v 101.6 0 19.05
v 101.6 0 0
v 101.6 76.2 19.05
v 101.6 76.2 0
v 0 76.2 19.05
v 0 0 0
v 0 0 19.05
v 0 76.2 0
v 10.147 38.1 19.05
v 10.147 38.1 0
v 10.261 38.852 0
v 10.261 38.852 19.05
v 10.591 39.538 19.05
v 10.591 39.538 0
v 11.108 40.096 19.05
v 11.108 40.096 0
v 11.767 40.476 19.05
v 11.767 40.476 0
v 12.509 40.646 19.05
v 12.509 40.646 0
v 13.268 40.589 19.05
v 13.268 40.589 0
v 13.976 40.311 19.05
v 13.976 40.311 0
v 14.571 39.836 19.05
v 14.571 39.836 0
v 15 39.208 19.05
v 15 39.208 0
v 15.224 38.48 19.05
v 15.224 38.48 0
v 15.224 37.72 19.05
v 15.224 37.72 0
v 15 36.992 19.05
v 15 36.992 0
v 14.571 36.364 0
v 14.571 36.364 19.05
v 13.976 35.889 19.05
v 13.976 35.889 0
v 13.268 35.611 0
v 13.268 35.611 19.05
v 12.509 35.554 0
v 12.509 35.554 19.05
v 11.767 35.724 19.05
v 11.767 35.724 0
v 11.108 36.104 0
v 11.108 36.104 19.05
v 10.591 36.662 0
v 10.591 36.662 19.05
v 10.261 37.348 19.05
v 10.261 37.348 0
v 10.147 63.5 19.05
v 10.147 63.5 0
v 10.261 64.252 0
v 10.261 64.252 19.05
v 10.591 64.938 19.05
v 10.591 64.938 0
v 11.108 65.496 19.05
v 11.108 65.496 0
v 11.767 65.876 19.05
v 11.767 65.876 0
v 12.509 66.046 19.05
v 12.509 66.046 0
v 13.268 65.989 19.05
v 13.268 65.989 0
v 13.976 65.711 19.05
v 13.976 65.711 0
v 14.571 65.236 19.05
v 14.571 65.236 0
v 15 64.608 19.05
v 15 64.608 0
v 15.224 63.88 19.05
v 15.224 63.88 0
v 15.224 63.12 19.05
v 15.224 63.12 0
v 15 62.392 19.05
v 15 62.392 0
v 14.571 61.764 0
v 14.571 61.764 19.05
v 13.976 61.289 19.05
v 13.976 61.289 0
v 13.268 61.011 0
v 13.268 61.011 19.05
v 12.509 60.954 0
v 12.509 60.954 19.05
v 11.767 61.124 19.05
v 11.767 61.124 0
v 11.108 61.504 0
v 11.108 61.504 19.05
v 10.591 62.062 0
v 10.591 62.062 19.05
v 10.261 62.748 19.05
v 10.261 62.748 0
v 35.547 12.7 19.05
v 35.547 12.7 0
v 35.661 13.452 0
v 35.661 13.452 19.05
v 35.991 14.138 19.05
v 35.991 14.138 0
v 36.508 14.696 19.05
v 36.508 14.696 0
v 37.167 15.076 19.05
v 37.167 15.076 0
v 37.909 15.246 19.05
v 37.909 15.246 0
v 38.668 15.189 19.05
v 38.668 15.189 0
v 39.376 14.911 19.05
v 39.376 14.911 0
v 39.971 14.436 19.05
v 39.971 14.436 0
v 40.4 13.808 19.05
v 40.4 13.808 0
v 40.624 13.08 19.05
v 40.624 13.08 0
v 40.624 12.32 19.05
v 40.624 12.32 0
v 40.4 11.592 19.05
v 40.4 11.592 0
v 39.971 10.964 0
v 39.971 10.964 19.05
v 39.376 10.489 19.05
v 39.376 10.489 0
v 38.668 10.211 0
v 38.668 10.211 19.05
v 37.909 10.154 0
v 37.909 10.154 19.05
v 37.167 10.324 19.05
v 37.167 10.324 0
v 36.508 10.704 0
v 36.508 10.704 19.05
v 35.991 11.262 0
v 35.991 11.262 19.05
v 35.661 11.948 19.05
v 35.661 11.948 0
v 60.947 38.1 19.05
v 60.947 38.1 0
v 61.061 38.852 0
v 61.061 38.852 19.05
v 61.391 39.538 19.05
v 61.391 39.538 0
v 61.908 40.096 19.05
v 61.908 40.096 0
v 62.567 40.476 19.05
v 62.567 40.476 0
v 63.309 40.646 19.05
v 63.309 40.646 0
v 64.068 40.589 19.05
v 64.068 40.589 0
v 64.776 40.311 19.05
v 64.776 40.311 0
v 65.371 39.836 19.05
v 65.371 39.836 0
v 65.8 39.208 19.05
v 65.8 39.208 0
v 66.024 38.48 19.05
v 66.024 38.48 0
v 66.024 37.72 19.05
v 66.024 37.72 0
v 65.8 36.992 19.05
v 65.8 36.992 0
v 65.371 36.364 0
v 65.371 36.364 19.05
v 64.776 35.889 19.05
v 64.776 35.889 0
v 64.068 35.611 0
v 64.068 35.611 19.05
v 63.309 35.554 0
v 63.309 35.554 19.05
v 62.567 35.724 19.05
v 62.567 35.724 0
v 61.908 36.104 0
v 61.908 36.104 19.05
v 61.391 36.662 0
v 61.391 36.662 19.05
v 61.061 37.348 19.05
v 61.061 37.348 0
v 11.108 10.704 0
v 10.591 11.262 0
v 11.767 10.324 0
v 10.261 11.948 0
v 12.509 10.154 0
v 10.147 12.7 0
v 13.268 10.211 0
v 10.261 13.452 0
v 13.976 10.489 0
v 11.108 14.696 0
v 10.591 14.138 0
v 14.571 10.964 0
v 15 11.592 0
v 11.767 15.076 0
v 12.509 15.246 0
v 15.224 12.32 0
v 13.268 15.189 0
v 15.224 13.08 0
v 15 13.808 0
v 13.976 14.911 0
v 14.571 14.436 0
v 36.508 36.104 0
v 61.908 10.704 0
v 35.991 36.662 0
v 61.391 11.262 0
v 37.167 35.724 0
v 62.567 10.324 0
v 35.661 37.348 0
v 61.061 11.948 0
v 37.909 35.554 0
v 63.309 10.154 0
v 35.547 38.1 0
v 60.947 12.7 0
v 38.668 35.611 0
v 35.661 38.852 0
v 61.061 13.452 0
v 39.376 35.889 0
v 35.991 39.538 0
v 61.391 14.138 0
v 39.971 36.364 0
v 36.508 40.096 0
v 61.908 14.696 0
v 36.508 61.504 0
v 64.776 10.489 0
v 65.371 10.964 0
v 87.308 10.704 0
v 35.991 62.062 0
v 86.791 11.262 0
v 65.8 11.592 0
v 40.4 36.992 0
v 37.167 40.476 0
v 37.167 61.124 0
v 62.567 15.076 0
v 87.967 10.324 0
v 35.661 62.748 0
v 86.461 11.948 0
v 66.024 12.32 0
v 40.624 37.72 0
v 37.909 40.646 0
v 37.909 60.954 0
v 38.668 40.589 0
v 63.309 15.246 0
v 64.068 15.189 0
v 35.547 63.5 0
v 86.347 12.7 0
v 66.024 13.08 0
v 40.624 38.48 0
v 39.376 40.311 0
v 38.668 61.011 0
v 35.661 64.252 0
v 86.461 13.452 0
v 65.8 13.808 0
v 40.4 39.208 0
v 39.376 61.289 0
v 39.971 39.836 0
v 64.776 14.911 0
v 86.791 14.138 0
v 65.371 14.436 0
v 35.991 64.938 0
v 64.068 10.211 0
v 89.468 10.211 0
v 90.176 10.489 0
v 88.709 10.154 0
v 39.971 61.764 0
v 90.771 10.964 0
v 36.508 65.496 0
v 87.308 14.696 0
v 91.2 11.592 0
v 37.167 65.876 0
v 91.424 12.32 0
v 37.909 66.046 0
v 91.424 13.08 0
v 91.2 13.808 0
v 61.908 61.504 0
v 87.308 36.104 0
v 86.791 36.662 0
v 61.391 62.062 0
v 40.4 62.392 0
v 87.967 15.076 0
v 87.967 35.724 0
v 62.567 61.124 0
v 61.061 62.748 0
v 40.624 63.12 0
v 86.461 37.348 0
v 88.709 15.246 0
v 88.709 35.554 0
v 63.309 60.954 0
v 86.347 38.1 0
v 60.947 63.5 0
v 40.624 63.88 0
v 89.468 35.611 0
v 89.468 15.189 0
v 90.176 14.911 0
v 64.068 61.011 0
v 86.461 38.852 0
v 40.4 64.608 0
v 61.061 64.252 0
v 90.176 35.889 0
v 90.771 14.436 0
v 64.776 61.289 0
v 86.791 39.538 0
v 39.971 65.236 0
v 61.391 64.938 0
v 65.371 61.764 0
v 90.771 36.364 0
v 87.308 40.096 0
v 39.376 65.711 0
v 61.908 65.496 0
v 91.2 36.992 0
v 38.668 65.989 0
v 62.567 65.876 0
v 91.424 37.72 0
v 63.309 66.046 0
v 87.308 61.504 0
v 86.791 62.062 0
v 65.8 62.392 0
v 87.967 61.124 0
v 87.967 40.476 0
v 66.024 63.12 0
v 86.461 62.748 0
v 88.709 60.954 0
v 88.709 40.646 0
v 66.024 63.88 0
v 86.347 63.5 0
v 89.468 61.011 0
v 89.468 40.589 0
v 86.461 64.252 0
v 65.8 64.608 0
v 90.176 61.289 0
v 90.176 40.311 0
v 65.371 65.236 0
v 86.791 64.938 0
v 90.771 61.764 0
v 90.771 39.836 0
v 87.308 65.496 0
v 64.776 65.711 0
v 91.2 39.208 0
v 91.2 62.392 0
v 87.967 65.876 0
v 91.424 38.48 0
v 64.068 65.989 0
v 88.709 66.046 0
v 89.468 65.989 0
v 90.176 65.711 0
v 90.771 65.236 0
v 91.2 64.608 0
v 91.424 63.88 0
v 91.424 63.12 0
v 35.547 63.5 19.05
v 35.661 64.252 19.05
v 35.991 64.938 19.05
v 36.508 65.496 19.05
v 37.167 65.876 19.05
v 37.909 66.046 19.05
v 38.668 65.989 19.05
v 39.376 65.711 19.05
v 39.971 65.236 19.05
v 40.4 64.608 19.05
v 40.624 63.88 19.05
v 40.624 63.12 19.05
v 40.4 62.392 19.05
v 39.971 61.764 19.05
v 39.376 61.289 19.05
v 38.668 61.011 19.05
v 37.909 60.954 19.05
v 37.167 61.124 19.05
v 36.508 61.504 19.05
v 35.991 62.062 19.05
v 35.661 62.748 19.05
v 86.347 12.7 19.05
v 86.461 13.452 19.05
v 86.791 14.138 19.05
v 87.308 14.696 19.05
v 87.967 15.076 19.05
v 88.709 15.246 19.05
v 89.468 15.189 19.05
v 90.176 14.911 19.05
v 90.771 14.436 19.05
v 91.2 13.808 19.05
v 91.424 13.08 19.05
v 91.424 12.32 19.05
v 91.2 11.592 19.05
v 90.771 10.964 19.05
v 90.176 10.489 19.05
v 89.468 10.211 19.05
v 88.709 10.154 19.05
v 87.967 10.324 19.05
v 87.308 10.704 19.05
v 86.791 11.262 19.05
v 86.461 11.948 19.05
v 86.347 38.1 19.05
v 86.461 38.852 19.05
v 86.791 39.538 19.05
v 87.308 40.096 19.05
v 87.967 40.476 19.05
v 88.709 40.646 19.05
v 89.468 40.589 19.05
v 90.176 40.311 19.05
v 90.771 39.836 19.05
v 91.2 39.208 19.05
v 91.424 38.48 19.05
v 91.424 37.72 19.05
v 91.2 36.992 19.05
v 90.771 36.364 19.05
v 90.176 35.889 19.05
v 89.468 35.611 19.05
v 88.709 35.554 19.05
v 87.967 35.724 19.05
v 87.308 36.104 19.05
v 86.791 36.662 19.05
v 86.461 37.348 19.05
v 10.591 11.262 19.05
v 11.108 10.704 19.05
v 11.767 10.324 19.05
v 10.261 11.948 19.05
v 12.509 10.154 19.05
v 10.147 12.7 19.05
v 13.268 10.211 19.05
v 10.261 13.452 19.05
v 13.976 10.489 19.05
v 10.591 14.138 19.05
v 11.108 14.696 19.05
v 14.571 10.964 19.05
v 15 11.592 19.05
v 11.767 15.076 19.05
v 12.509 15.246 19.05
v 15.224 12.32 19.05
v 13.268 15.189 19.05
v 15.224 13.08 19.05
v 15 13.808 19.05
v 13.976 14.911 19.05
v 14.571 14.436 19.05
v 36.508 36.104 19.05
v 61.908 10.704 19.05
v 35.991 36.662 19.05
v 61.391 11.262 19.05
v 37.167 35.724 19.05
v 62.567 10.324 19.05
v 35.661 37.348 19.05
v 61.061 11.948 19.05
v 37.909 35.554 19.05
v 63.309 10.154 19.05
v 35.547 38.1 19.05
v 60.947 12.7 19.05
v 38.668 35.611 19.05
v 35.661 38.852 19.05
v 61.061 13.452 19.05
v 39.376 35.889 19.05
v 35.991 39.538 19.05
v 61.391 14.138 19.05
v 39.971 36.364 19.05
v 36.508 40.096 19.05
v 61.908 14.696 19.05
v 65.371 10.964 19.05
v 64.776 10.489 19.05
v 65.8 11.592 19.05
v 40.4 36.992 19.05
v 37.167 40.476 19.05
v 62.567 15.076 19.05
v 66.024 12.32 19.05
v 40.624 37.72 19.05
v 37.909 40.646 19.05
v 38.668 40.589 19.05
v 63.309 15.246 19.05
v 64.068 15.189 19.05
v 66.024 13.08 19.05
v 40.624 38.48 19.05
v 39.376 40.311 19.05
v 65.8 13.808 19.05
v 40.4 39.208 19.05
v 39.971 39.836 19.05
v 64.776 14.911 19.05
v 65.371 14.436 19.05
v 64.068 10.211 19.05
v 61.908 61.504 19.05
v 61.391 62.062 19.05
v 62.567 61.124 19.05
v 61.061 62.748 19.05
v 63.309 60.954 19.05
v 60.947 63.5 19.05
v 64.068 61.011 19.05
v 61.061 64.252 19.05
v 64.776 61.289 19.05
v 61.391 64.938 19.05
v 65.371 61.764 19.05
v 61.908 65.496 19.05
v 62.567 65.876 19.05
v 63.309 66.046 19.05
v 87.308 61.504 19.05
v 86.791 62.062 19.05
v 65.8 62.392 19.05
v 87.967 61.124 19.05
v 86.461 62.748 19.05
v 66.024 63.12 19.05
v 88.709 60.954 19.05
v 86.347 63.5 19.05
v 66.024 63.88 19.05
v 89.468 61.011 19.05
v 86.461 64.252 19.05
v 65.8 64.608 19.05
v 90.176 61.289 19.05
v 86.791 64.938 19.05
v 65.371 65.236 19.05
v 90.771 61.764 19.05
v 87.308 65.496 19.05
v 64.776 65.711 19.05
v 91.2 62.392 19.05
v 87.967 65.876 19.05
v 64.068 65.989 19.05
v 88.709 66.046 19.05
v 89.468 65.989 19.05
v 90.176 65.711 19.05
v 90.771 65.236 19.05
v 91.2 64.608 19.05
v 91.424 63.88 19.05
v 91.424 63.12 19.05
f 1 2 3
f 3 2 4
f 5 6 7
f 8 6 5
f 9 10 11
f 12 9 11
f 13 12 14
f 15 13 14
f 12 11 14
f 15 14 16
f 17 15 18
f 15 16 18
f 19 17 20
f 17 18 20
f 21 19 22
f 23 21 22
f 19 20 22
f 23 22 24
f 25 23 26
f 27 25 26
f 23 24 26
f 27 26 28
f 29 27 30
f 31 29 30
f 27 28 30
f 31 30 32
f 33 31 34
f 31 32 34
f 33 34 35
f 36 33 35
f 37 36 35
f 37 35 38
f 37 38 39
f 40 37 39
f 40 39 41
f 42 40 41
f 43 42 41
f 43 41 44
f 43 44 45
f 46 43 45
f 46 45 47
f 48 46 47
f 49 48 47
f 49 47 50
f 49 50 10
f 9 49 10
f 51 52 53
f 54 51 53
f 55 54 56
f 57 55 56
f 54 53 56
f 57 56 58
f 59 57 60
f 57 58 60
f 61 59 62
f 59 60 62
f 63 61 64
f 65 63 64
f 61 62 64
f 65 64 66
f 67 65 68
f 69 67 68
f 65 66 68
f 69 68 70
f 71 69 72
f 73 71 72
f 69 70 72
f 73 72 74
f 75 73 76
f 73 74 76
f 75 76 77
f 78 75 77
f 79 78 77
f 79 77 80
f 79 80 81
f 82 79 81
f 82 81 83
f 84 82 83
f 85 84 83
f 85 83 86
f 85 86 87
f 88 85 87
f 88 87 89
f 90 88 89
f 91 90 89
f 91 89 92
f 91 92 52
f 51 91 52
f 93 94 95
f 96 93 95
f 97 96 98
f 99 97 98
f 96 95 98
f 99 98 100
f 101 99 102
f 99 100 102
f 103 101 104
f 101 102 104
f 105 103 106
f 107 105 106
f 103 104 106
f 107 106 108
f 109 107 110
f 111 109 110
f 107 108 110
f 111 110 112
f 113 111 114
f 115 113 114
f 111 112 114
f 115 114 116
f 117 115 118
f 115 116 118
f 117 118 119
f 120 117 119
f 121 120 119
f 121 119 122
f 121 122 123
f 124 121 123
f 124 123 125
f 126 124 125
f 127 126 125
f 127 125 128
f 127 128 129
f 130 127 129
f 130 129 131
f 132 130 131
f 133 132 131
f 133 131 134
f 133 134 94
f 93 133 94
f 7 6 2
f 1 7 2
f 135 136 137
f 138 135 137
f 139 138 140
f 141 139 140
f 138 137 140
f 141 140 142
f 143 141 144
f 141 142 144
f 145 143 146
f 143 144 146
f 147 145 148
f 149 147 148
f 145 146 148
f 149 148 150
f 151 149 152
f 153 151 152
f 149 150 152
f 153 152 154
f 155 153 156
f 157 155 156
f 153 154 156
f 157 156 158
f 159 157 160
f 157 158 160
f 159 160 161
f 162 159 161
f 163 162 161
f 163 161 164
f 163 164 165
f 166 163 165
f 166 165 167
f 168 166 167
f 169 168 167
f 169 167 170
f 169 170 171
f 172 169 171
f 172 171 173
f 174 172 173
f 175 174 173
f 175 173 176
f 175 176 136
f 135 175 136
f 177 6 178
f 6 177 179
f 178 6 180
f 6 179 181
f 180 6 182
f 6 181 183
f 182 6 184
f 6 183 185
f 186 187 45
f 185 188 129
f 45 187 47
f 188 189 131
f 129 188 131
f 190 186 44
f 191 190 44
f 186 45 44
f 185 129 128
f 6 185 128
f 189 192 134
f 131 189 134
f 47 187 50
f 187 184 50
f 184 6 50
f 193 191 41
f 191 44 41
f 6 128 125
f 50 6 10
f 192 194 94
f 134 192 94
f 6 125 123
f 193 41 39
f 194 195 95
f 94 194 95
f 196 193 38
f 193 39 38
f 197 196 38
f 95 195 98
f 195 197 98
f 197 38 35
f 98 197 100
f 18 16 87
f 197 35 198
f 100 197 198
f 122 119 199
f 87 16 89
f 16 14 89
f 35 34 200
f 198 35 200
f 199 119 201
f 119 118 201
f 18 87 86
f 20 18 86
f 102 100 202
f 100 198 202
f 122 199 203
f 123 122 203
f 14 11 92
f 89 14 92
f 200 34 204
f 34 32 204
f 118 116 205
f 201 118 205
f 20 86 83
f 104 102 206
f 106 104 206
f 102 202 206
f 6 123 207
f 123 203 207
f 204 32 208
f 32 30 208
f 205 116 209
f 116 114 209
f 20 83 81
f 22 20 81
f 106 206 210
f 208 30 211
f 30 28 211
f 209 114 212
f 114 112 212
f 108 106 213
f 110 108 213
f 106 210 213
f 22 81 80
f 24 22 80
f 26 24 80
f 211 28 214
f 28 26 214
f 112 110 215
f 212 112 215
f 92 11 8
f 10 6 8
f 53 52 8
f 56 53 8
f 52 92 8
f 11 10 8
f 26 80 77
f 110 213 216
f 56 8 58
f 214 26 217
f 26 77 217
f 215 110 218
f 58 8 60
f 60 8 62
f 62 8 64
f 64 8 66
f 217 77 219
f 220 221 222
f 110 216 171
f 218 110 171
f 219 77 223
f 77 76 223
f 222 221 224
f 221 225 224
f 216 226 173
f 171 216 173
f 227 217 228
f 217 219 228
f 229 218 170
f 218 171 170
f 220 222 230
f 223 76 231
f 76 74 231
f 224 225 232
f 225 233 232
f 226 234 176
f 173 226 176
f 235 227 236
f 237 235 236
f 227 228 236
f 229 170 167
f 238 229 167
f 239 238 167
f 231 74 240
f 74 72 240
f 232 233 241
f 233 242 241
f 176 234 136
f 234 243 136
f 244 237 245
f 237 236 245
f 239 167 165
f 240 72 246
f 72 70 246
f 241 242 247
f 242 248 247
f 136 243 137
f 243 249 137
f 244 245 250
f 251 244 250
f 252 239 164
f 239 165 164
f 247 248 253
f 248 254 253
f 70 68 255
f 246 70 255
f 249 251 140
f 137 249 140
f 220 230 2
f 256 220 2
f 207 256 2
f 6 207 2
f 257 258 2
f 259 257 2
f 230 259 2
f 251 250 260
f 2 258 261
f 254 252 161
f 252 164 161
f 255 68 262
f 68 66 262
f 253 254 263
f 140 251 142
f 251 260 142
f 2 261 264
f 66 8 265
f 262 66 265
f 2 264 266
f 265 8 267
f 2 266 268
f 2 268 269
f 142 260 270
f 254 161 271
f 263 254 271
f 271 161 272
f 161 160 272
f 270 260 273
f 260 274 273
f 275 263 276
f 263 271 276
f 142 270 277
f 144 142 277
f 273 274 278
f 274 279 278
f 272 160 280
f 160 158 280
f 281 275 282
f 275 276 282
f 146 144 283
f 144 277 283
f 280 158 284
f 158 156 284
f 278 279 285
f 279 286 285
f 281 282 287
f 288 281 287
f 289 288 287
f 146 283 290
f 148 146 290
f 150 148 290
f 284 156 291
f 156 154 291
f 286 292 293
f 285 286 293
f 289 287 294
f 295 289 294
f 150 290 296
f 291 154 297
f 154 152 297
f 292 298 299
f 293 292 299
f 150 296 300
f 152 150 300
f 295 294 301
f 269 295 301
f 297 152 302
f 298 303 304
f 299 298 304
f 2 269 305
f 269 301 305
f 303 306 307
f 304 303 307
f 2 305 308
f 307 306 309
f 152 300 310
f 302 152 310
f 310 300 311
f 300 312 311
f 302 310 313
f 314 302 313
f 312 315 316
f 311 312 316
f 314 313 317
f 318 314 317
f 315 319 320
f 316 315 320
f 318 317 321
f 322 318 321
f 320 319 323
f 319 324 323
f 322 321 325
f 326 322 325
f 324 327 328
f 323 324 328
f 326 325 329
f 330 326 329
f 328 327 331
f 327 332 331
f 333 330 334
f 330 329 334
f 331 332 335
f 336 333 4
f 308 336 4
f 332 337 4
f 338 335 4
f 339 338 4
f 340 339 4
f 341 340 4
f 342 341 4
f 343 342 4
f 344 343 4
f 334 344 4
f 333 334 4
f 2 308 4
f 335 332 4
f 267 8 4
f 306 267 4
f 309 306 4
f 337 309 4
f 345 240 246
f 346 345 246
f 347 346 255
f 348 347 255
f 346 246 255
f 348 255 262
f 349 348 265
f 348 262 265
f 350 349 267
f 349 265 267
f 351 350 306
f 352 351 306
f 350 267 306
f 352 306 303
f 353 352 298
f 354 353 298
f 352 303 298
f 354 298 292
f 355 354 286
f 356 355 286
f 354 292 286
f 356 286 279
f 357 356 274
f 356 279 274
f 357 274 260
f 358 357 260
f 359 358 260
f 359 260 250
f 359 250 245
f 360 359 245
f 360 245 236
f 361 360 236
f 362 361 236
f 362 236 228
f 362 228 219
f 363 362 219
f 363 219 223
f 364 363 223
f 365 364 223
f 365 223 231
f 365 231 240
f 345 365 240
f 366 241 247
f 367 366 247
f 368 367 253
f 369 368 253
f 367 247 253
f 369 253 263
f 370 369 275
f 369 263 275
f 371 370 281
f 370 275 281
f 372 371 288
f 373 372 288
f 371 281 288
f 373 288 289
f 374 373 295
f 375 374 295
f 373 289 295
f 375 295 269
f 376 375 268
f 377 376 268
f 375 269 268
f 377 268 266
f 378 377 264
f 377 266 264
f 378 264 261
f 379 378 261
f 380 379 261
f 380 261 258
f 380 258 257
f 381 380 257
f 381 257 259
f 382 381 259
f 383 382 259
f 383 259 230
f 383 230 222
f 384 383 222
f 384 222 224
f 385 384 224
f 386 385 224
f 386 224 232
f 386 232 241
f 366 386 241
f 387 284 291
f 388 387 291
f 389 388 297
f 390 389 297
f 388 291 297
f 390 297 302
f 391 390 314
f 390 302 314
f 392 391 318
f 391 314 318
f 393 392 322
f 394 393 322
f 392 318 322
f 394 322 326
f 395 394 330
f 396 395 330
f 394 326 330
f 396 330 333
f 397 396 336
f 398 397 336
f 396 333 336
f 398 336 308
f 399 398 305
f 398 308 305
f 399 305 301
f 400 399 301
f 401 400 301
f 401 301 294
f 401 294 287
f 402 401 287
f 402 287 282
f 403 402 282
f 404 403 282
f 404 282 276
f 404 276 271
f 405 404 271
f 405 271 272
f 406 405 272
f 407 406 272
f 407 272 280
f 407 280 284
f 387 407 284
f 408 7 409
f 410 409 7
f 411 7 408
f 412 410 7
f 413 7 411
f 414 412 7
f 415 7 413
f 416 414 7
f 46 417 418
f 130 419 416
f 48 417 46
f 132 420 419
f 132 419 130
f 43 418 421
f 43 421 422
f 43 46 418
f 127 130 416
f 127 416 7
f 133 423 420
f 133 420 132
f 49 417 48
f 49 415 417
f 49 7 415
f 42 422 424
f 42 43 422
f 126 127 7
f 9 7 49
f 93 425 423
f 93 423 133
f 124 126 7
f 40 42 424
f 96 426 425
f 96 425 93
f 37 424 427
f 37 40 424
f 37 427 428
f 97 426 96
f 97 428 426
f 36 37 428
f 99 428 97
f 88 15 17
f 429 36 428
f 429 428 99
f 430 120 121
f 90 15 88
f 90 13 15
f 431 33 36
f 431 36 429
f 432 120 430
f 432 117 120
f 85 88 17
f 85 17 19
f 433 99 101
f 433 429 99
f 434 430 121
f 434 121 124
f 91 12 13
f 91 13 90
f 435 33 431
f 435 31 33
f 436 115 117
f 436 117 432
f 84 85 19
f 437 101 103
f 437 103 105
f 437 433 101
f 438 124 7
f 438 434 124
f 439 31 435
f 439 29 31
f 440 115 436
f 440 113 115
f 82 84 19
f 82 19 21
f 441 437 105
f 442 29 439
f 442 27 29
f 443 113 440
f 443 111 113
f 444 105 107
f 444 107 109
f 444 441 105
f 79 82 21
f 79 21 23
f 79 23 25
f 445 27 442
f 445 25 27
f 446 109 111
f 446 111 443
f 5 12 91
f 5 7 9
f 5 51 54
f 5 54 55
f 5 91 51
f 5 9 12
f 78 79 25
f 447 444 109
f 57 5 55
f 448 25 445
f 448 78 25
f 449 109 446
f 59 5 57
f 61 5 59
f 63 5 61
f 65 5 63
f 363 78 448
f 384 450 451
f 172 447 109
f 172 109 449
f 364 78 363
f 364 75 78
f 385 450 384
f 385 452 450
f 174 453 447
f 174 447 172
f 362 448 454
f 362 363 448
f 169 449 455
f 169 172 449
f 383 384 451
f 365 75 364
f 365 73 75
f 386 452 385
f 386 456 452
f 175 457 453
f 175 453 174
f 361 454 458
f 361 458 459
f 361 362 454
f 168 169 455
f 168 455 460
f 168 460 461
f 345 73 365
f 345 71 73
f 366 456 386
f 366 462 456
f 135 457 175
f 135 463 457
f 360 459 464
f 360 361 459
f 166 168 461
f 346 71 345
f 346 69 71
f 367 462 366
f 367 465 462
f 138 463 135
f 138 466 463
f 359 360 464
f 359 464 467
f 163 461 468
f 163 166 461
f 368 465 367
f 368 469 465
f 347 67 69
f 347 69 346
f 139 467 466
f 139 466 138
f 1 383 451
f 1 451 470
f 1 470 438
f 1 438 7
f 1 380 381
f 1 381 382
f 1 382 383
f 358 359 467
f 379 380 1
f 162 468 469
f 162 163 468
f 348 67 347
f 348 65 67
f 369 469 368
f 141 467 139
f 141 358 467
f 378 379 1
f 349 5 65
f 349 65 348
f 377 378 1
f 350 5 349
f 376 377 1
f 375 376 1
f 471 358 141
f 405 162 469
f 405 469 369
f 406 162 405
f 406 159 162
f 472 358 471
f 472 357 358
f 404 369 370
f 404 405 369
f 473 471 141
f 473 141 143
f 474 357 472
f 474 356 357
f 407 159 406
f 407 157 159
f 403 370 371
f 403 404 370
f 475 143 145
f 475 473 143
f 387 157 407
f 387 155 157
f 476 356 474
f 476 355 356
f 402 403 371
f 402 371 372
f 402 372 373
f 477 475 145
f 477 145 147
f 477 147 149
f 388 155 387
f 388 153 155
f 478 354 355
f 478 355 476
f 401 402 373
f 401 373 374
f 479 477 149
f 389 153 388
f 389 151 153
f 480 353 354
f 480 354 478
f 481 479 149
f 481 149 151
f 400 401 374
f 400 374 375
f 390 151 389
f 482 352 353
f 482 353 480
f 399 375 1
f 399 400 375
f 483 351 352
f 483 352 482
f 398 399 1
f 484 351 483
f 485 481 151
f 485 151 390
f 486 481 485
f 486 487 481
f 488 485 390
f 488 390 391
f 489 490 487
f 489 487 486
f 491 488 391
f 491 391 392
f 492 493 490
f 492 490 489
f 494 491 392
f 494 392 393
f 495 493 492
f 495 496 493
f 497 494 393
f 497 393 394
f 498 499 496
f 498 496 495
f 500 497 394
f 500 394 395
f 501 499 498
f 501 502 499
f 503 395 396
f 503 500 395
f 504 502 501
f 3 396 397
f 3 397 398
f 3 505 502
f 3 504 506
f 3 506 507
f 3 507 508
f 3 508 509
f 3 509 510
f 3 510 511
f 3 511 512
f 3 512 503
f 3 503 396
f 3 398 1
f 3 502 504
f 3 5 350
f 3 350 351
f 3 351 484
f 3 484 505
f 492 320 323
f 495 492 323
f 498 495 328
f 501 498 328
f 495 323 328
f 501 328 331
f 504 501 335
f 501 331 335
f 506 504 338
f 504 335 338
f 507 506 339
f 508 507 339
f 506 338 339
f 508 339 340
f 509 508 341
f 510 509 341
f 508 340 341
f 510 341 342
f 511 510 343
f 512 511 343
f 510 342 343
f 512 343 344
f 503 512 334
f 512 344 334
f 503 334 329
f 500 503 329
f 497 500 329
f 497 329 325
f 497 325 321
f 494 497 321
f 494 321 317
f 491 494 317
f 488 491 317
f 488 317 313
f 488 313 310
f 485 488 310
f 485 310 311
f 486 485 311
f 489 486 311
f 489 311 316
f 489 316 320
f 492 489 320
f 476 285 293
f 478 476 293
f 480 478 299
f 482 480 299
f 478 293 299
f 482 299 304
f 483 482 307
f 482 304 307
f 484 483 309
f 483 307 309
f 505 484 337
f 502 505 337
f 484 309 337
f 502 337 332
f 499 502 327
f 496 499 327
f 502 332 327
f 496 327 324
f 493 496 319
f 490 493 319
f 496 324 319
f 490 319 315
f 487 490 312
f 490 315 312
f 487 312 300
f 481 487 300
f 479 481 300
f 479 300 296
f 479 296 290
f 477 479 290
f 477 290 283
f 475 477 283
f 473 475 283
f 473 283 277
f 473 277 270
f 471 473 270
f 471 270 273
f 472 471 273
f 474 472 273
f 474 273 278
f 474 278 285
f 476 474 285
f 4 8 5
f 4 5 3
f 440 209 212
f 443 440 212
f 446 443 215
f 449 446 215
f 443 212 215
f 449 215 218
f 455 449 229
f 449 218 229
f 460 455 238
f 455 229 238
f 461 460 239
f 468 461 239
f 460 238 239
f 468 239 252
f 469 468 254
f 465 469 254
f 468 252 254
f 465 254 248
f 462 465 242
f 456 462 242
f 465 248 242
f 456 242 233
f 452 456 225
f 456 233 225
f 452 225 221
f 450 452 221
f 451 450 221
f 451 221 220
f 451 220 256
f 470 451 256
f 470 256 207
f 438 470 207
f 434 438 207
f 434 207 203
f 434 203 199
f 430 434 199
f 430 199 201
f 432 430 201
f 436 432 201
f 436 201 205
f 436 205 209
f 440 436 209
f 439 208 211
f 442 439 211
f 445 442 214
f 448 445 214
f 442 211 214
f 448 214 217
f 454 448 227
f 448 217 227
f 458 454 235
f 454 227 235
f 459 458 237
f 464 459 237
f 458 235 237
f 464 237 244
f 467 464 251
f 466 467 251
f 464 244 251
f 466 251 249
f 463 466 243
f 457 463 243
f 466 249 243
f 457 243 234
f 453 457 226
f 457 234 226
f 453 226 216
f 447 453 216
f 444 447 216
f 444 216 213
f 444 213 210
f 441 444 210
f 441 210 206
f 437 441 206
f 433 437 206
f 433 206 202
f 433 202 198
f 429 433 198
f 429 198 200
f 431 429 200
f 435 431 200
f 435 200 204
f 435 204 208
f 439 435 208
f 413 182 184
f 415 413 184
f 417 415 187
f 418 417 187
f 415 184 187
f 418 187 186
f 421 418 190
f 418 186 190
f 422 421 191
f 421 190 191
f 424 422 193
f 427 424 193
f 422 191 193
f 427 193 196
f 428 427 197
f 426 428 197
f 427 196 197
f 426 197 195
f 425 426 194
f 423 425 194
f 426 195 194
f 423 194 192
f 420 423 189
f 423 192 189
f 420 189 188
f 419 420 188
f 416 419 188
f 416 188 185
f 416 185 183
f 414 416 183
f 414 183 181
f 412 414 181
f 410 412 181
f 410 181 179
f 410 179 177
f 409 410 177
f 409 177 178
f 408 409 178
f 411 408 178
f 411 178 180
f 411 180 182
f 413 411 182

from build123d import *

# Parameters (mm, degrees)
SKETCH1_W               = 101.6
SKETCH1_H               = 76.2
BOSS_EXTRUDE1_DEPTH     = 19.05
F_1_4_20_TAPPED_HOLE1_D = 5.1054
LPATTERN1_COUNT         = 4
LPATTERN1_PITCH         = 25.4
LPATTERN1_COUNT_DIR2    = 3
LPATTERN1_PITCH_DIR2    = 25.4


with BuildPart() as part:
    # Sketch1 → Boss-Extrude1 (new body)
    with BuildSketch(Plane.XY):
        with Locations((50.8, 38.1)):
            Rectangle(SKETCH1_W, SKETCH1_H)
    extrude(amount=BOSS_EXTRUDE1_DEPTH)

    # 1/4-20 Tapped Hole1 (through all)
    with Locations(Plane.XY.offset(19.05)):
        with Locations((12.7, 63.5)):
            f_1_4_20_tapped_hole1 = Hole(F_1_4_20_TAPPED_HOLE1_D / 2)

    # LPattern1: 1_4-20 Tapped Hole1 4 × 3
    with Locations(*[(i * LPATTERN1_PITCH, -j * LPATTERN1_PITCH_DIR2, 0) for i in range(LPATTERN1_COUNT) for j in range(LPATTERN1_COUNT_DIR2) if (i, j) != (0, 0)]):
        add(f_1_4_20_tapped_hole1, mode=Mode.SUBTRACT)


solid = part.part
